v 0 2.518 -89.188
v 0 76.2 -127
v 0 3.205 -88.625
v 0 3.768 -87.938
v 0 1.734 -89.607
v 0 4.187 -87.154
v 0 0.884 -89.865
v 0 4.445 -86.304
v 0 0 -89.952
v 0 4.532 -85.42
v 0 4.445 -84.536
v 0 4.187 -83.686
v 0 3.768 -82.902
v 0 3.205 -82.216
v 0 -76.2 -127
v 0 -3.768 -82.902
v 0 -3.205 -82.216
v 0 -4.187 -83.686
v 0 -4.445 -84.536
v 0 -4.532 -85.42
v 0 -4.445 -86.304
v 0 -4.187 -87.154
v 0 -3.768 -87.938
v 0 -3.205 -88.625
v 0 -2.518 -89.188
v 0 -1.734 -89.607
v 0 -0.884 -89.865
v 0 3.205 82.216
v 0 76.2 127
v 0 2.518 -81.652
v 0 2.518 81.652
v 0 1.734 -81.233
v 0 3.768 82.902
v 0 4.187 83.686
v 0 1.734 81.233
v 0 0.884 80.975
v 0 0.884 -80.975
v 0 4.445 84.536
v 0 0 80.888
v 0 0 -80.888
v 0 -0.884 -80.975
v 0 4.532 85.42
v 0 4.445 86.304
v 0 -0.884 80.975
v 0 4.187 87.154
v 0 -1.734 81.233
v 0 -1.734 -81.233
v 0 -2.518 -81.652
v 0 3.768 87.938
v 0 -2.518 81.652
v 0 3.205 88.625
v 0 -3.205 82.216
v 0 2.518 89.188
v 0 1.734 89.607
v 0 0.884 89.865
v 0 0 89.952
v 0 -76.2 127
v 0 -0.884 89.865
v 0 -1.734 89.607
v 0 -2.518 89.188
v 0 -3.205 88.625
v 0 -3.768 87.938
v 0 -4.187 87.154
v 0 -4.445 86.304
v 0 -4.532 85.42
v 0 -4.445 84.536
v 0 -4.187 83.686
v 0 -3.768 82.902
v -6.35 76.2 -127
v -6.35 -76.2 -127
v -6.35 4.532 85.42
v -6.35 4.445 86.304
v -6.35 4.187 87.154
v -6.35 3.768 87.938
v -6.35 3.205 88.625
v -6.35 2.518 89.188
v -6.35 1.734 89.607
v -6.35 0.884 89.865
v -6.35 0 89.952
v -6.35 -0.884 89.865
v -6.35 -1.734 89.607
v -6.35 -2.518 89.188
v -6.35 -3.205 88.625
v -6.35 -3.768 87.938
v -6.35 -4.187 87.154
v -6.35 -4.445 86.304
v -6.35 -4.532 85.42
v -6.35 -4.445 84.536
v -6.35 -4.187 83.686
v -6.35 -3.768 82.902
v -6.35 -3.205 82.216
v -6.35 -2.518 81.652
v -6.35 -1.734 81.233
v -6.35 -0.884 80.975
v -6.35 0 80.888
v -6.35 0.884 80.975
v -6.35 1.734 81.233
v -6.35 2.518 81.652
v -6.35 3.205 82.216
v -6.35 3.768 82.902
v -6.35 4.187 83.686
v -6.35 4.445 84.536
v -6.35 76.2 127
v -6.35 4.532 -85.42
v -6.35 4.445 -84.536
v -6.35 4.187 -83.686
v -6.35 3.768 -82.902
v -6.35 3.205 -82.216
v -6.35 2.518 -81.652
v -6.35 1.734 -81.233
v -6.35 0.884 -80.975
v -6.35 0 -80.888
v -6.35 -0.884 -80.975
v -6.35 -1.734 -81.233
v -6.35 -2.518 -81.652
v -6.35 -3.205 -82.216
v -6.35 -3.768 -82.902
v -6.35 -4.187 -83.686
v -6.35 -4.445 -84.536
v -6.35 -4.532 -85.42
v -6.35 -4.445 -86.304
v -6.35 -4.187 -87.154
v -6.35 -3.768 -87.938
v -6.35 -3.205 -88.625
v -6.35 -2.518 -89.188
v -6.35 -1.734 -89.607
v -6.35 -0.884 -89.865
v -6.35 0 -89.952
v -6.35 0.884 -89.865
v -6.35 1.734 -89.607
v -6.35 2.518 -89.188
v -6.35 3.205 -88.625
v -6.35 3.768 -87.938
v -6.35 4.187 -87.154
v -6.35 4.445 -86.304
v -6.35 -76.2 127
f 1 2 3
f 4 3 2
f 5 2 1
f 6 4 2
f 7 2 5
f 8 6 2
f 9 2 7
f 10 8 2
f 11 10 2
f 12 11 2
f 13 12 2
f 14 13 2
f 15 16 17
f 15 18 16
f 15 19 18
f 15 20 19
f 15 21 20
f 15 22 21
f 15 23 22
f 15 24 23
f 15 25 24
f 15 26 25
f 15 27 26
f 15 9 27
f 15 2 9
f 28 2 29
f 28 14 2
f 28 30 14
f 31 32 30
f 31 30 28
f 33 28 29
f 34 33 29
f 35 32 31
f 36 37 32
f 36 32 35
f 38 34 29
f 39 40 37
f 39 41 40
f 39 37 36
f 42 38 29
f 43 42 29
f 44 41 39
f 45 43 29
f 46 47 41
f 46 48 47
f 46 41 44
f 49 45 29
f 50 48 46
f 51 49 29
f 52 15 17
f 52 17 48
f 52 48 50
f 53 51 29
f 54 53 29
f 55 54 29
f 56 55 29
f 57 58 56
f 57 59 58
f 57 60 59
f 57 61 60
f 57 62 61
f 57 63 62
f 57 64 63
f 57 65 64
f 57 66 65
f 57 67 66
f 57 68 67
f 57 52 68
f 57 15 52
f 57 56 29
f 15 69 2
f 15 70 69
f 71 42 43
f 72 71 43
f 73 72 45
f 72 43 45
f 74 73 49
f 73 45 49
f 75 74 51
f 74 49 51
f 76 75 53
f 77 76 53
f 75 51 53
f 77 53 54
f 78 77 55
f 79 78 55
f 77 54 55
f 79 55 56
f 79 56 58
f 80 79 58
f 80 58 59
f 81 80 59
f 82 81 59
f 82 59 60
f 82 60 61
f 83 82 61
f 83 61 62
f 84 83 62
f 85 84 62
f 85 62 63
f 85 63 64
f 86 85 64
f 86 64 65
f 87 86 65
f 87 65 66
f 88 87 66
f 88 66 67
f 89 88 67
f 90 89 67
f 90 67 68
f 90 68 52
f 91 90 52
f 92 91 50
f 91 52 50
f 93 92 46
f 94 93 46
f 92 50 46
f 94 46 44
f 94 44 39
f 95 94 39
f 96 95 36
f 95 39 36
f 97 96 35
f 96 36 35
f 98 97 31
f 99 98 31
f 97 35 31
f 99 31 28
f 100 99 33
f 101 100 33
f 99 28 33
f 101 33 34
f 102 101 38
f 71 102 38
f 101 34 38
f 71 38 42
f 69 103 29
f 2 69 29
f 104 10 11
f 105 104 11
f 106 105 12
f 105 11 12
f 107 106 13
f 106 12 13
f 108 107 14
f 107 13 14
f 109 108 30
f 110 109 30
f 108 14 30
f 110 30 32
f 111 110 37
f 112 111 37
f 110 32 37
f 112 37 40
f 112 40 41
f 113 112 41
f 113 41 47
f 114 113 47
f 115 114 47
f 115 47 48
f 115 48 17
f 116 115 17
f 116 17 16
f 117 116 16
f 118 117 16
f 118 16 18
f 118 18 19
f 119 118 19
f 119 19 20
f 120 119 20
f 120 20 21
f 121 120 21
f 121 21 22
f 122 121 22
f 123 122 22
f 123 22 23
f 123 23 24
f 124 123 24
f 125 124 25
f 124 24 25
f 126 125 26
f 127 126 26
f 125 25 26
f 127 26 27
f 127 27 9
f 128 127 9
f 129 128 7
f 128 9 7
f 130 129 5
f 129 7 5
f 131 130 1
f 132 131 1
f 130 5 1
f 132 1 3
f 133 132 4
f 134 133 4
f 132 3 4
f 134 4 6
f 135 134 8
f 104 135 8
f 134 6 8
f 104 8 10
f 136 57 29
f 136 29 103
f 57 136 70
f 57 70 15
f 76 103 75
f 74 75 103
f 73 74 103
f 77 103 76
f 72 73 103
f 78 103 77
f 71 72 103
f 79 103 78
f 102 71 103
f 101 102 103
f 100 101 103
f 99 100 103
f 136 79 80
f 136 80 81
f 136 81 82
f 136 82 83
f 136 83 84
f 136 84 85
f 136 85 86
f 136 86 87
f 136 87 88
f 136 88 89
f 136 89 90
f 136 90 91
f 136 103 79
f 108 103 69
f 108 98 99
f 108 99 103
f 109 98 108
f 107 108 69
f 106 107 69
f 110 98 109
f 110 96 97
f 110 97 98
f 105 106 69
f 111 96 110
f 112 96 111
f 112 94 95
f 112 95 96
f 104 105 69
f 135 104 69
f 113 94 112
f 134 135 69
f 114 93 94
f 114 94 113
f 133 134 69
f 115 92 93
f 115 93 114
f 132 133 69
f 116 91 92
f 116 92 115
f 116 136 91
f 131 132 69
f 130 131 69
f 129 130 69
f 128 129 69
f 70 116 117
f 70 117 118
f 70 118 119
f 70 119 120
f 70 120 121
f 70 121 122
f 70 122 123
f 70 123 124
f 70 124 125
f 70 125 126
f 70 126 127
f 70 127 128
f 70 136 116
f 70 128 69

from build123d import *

# Parameters (mm, degrees)
F1_DEPTH = 76.2
F2_R     = 4.5318999151
F3_DEPTH = 6.351


# Not quite as in the source:
# - a feature names something its author has since deleted; it is built from what else it names


with BuildPart() as f1:
    # F0 (on Front) → F1 (new body, symmetric)
    with BuildSketch(Plane.XZ):
        Polygon((0, -127), (0, 0), (0, 127), (-6.35, 127), (-6.35, 0), (-6.35, -127), align=None)
    extrude(amount=F1_DEPTH, both=True)

    # F2 (on face) → F3 (cut, through all)
    with BuildSketch(Plane.YZ):
        with Locations((0, -85.4202)):
            Circle(F2_R)
        with Locations((0, 85.4202)):
            Circle(F2_R)
    extrude(amount=-F3_DEPTH, mode=Mode.SUBTRACT)


solid = f1.part
